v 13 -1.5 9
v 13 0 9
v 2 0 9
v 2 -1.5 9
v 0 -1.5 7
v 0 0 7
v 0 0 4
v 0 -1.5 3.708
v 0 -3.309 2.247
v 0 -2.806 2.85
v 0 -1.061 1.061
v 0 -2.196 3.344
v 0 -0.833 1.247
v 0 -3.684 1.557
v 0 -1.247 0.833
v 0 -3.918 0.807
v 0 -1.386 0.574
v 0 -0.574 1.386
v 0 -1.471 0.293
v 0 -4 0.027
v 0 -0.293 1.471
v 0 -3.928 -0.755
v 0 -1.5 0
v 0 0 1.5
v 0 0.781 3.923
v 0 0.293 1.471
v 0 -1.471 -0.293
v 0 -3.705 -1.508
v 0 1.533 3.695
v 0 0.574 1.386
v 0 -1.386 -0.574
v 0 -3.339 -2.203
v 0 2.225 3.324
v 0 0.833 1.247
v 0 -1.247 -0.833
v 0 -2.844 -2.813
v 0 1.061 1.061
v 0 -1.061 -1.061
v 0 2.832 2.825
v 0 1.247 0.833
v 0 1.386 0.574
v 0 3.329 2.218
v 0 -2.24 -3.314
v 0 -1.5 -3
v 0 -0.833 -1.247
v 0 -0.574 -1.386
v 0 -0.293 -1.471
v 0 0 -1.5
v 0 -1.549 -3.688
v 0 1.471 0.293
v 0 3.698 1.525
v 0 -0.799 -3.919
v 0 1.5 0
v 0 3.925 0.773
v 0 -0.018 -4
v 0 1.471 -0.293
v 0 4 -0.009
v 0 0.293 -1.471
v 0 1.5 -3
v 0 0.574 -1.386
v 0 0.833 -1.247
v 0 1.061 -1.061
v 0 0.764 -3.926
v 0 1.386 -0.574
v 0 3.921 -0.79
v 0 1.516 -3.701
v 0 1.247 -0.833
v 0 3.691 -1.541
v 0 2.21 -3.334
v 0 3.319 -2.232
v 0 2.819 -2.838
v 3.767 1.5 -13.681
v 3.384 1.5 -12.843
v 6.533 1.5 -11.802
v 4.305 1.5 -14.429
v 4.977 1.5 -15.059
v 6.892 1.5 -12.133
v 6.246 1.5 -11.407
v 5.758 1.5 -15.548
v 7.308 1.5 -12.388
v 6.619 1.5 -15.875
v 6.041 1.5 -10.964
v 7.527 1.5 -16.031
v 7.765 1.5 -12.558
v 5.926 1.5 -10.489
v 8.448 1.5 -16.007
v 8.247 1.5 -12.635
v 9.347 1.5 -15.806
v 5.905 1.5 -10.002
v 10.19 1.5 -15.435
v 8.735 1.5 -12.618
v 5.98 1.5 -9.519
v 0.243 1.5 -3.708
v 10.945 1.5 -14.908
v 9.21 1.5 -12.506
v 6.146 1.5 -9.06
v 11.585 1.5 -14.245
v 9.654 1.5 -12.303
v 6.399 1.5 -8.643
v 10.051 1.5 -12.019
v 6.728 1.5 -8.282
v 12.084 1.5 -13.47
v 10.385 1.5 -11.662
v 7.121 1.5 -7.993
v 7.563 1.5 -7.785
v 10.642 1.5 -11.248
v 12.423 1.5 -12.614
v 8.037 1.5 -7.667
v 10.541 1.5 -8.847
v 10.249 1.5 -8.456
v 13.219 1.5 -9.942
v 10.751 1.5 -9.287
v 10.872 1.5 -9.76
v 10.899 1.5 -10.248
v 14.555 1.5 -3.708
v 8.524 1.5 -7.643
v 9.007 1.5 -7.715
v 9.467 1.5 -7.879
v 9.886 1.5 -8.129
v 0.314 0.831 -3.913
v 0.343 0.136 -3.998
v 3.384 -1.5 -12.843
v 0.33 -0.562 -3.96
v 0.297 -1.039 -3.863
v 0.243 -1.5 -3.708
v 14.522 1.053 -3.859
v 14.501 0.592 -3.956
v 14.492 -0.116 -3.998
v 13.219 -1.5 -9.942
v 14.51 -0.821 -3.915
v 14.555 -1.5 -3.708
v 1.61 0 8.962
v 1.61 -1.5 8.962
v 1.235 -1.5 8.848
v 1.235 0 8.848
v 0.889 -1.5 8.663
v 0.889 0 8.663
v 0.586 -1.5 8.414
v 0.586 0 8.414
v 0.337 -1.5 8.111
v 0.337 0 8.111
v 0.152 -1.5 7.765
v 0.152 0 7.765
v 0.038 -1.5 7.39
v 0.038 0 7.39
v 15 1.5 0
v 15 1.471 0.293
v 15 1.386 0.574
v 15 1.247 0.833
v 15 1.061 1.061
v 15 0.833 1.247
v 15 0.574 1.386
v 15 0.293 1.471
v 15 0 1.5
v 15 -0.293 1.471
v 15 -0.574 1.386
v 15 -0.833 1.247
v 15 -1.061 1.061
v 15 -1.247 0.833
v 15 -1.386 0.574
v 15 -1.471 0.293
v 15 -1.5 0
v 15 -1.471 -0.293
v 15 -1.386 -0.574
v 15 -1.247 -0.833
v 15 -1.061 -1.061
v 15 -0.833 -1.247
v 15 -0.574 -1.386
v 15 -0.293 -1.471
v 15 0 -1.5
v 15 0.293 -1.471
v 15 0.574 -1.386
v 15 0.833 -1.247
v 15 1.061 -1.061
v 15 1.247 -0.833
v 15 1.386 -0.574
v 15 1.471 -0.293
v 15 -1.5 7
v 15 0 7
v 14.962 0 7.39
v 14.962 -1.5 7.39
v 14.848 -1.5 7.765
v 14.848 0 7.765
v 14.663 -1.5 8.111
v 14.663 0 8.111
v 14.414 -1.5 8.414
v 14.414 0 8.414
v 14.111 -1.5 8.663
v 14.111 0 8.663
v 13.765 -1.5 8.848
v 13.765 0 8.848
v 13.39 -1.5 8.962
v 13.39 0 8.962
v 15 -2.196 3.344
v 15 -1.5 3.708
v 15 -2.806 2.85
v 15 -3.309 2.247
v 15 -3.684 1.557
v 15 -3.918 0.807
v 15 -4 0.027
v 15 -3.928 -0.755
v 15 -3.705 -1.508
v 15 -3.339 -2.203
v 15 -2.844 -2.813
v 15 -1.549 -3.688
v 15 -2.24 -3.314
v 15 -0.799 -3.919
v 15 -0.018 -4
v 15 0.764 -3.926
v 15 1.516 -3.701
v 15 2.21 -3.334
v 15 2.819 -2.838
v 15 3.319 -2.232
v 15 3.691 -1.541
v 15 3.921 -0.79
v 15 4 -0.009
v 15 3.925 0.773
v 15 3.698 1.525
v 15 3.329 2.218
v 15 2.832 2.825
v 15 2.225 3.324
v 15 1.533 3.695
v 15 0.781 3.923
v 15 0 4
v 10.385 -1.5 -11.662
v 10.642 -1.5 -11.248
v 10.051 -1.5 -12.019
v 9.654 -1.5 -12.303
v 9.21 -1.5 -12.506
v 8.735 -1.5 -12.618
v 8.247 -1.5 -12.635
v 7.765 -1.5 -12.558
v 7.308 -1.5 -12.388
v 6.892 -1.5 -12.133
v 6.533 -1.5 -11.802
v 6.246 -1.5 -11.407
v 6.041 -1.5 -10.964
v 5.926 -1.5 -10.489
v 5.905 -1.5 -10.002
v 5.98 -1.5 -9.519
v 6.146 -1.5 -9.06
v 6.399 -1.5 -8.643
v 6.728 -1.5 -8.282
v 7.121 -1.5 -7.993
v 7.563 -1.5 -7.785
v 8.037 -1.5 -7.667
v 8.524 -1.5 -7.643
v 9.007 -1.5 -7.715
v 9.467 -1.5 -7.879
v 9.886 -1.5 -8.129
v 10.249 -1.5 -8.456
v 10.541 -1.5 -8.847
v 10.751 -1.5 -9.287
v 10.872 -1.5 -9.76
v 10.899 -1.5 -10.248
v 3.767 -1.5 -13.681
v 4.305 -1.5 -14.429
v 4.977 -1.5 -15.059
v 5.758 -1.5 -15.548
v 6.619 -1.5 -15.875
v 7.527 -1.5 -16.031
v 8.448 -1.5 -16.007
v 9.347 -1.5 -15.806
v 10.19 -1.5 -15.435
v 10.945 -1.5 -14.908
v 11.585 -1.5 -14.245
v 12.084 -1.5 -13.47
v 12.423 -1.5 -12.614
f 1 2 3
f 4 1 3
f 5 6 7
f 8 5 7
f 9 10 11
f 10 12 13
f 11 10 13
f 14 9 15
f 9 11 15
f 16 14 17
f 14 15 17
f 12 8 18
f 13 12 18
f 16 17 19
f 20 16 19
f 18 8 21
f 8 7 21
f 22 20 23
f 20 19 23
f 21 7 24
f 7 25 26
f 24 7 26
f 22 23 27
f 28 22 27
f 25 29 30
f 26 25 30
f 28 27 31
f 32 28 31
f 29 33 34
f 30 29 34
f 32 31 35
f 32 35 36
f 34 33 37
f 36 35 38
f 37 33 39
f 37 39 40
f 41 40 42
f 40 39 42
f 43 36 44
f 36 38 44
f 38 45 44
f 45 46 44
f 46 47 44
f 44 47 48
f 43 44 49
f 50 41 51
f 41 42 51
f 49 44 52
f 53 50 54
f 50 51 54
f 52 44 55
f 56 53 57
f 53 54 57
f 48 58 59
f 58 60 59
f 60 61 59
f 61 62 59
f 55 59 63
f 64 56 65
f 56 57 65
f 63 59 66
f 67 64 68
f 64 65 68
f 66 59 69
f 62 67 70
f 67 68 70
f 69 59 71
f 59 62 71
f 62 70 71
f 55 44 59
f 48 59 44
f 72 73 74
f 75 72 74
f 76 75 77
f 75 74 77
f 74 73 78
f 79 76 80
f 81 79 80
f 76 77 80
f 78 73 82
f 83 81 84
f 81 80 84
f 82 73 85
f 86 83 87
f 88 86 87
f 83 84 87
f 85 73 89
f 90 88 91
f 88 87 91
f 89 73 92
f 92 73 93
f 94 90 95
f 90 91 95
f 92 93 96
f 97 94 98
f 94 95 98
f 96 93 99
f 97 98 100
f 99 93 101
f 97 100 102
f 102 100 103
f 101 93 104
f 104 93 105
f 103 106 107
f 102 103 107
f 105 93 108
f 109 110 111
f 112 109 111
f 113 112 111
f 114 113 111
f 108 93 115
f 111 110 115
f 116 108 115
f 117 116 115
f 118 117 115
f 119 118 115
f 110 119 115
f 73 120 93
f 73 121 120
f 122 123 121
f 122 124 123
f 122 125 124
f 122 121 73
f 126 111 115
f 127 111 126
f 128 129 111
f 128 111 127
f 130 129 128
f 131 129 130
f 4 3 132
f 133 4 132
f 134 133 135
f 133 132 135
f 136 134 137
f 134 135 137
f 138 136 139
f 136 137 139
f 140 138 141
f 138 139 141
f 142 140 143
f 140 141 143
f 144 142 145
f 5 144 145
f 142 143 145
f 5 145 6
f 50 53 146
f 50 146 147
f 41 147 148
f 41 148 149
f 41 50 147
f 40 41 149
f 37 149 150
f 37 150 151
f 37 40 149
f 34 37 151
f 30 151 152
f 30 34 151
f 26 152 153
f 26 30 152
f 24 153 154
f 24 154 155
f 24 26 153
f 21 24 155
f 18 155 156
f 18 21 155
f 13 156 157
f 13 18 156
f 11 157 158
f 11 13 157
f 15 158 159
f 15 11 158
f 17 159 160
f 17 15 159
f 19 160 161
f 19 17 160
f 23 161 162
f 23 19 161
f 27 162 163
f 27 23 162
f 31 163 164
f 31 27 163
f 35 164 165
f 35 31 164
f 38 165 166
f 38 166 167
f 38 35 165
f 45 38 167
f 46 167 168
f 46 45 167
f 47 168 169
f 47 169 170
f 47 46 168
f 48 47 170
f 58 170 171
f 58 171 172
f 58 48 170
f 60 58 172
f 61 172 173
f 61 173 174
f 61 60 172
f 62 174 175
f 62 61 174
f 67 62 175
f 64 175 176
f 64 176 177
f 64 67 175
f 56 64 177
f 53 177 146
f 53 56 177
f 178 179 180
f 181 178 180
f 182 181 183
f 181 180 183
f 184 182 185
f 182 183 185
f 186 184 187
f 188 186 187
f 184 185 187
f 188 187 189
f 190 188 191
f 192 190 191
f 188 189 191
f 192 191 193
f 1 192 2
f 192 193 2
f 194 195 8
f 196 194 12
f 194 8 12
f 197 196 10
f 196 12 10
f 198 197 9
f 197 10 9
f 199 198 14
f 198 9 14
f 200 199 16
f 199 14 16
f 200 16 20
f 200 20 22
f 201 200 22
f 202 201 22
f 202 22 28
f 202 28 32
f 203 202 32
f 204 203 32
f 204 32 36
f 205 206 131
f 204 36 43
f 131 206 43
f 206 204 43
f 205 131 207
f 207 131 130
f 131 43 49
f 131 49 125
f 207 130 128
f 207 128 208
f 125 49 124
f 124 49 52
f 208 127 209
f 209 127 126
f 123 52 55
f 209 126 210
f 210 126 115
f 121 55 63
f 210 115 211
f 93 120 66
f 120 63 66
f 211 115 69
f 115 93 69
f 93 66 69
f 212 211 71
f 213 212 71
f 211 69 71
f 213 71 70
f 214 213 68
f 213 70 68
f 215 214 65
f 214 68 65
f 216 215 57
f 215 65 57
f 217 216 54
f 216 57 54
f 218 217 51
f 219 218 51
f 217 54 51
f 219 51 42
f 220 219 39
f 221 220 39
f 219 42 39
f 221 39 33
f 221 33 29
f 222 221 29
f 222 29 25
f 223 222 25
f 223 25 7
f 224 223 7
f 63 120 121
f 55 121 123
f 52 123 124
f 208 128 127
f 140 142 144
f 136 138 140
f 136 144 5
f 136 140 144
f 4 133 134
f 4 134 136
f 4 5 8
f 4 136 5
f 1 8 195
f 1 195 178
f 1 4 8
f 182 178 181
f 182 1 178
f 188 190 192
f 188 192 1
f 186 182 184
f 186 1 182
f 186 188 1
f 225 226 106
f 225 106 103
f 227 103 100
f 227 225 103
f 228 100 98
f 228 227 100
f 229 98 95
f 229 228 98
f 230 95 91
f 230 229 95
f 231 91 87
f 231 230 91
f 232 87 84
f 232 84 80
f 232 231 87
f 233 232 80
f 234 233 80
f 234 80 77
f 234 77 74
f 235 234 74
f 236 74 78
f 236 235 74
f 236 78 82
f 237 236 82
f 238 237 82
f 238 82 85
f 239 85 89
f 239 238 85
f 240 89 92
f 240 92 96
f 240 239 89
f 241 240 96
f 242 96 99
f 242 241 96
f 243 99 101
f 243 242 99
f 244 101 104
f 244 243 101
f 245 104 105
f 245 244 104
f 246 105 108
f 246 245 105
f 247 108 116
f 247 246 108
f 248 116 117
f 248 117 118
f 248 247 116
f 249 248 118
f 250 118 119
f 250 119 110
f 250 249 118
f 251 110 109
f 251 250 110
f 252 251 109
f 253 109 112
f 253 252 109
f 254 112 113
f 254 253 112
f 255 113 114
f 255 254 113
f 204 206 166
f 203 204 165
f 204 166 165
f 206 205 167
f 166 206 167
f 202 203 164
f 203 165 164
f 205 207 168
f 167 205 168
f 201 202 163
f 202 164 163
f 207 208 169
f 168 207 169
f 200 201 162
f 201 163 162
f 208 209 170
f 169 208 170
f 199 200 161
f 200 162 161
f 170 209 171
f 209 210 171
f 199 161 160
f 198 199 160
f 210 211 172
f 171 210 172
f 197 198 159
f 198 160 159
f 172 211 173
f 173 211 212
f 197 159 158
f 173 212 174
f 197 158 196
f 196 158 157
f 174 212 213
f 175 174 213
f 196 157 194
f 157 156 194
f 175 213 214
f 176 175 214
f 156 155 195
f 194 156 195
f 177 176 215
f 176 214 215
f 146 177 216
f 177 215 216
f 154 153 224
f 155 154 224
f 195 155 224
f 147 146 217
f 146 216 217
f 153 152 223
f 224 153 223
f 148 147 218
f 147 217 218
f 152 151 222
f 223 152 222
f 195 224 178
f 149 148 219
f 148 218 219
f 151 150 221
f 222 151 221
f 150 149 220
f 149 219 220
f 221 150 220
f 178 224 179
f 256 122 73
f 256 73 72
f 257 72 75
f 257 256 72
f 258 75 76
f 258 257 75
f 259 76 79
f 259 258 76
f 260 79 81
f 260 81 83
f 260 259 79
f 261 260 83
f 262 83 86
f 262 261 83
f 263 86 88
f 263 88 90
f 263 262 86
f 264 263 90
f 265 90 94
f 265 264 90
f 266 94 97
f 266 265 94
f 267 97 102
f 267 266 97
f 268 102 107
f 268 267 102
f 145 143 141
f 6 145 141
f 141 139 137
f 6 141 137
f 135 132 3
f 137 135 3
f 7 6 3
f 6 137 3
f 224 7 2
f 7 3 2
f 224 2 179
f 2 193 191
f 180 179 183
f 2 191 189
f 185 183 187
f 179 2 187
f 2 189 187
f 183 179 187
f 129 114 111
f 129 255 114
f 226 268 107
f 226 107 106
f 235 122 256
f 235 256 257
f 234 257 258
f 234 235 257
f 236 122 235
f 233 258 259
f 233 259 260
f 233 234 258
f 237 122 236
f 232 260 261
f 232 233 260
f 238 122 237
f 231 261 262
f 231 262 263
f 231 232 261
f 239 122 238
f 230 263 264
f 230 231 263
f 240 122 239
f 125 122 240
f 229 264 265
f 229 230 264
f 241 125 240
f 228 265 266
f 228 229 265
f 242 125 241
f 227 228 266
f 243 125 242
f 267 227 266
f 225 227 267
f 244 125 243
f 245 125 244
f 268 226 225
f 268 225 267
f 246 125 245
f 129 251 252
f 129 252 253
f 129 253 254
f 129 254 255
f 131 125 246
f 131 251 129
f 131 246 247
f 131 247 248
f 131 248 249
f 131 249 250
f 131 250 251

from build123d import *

# Parameters (mm, degrees)
F0_R     = 4
F0_R_2   = 1.5
F1_DEPTH = 15
F3_DEPTH = 1.5
F5_DEPTH = 1.5


with BuildPart() as f1:
    # F0 (on Right) → F1 (new body)
    with BuildSketch(Plane.YZ):
        Circle(F0_R)
        Circle(F0_R_2, mode=Mode.SUBTRACT)
    extrude(amount=F1_DEPTH)

    # F2 (on Front) → F3 (join, symmetric)
    with BuildSketch(Plane.XZ):
        with BuildLine():
            Line((14.70626425, -3), (0, -3))
            Line((0, -3), (3.3842294856, -12.8433583514))
            ThreePointArc((3.3842294856, -12.8433583514), (7.9879322575, -16.0413339461), (12.4233677026, -12.6137926218))
            Line((12.4233677026, -12.6137926218), (10.6424884871, -11.2477112561))
            ThreePointArc((10.6424884871, -11.2477112561), (5.979534847, -9.5192649707), (10.8988873674, -10.2477112561))
            Line((10.8988873674, -10.2477112561), (13.2192947992, -9.9418605826))
            Line((13.2192947992, -9.9418605826), (14.70626425, -3))
        make_face()
    extrude(amount=F3_DEPTH, both=True)

    # F4 (on Front) → F5 (join)
    with BuildSketch(Plane.XZ):
        with BuildLine():
            Line((0, 7), (0, 3))
            Line((0, 3), (15, 3))
            Line((15, 3), (15, 7))
            ThreePointArc((15, 7), (14.4142135624, 8.4142135624), (13, 9))
            Line((13, 9), (2, 9))
            ThreePointArc((2, 9), (0.5857864376, 8.4142135624), (0, 7))
        make_face()
    extrude(amount=F5_DEPTH)


solid = f1.part
